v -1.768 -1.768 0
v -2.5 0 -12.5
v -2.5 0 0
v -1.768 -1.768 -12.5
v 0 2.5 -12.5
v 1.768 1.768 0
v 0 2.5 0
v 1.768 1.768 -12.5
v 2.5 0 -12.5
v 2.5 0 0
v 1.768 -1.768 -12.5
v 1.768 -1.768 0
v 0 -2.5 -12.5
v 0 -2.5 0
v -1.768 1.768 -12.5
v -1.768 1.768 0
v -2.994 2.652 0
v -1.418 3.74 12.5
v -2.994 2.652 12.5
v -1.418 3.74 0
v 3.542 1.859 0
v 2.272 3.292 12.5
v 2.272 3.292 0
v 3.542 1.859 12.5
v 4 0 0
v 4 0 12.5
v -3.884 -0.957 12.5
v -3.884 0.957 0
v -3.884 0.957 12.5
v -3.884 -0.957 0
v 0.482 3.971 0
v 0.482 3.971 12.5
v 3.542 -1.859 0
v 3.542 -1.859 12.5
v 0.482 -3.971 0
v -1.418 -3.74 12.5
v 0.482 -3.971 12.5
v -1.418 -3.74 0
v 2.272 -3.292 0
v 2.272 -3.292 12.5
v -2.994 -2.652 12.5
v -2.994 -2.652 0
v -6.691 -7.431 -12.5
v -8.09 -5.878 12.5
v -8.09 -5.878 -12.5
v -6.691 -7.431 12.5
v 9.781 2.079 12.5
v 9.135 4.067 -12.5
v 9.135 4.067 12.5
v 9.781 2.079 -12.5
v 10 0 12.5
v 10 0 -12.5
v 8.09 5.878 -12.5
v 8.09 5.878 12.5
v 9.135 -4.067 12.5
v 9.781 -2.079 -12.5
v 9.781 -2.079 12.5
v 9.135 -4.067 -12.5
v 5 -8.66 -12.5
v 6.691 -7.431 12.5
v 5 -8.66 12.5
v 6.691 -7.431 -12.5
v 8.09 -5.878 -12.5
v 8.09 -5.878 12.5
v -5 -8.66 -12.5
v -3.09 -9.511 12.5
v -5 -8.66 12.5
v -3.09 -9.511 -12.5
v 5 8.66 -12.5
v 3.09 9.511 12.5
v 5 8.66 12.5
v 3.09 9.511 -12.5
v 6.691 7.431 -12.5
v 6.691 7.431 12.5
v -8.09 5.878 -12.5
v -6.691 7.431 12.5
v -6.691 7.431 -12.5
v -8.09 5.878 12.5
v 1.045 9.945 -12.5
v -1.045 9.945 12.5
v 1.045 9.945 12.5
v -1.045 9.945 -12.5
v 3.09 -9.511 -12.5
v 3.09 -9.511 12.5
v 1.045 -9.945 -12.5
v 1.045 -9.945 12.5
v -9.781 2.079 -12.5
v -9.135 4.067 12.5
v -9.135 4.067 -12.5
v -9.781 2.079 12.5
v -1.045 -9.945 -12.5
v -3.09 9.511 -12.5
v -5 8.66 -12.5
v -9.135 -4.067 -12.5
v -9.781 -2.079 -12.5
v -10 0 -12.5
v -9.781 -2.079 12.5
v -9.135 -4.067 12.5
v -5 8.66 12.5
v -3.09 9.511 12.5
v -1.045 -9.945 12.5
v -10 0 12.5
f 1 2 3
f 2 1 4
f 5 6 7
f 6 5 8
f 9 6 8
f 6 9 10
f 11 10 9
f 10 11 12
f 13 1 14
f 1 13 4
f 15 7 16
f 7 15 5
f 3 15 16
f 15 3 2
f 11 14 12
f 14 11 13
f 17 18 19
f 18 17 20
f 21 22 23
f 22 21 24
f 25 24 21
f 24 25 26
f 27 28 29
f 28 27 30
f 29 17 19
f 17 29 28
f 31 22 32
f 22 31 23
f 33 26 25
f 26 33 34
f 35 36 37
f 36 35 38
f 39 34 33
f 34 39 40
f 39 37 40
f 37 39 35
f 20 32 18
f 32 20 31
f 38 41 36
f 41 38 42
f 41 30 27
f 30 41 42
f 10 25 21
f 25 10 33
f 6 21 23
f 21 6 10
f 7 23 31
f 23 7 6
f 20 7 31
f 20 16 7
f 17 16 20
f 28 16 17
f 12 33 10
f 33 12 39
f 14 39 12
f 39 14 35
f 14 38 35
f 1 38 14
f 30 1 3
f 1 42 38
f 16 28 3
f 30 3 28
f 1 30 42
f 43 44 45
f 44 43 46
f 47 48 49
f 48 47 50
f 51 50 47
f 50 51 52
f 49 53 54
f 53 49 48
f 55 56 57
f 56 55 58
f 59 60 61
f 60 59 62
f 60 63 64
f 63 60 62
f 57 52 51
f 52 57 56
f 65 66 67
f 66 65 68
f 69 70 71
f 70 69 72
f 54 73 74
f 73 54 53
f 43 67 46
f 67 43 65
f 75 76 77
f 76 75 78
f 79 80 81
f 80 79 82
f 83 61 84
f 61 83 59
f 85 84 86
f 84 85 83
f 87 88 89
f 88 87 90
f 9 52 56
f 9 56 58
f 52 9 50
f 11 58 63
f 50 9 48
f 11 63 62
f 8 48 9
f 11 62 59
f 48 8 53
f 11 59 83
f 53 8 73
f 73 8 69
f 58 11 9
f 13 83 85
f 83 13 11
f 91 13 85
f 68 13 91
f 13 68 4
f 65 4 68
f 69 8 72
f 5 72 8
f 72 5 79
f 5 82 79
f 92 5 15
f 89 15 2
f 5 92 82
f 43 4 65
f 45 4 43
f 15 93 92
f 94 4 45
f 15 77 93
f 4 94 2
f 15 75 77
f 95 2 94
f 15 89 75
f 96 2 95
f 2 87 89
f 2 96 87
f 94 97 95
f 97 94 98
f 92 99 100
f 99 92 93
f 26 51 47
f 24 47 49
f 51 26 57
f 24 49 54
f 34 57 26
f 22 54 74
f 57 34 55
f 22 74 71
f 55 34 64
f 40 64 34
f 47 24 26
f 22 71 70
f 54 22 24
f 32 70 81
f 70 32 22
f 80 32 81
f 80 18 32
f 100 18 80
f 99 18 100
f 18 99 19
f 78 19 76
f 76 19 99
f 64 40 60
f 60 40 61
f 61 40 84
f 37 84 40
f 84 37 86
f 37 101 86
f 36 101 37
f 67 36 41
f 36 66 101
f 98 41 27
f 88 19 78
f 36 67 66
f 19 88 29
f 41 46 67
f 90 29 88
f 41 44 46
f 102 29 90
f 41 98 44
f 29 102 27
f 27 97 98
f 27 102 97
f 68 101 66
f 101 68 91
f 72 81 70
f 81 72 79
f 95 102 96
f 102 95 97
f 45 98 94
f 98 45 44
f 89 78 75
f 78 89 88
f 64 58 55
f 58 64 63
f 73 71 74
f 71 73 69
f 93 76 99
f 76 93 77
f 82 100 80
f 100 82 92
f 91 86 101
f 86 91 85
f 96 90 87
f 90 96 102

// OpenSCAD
// file: helper.scad
//$fa=5; $fs=0.1;

// скругление - это надо вычитать 
//module rounder(corner=[0,0,0], rradius=2, rheight){
//        translate(corner) 
//            difference(){
//                cube([rradius,rradius,rheight]);
//                translate([rradius,rradius,0]) cylinder(r=rradius, h=rheight);
//            }
//}   

// параллелепипед со скругленными вертикальными ребрами
module cuberv(size, rradius=2){
    hull(){
        translate([rradius,rradius,0]) cylinder(r=rradius, h=size[2]);
        translate([size[0]-rradius, rradius, 0]) cylinder(r=rradius, h=size[2]);
        translate([rradius, size[1]-rradius, 0]) cylinder(r=rradius, h=size[2]);
        translate([size[0]-rradius, size[1]-rradius, 0]) cylinder(r=rradius, h=size[2]);
    }
}


//rounder([0,0,0], 2, 30);
//cuberv([30,30,30]);
// main file
use <helper.scad>

//профиль
//module profile(length) {
//	color([0.7,0.7,0.7]) scale([1,1,length]) translate([-100, -100, -0.5]) import("prof20x20.stl", convexity=3);
//}
// упрощенный
module profile(length) {
    color([0.7,0.7,0.7])
        difference(){
            union(){
                cube([20,20,length], center=true);
            }//u
            union(){
                translate([-10, 0, 0]) cylinder(r=3, h=length+0.1, center=true);
                translate([10, 0, 0]) cylinder(r=3, h=length+0.1, center=true);
                translate([0, 10, 0]) cylinder(r=3, h=length+0.1, center=true);
                translate([0, -10, 0]) cylinder(r=3, h=length+0.1, center=true);
            }//u
        }//d
}//m

//profile(100);

// уголок профильный
module corner(){
	difference(){
		linear_extrude(height = 20) polygon([[0,0],[25,0],[25,5],[5,25],[0,25]]);
		
		union(){
			translate([-0.1, 17, 10]) rotate([0,90,0]) cylinder (r=2.2, h=20);
			translate([8, 17, 10]) rotate([0,90,0]) cylinder (r=6, h=10);
	
			translate([17, -0.1, 10]) rotate([-90,0,0]) cylinder (r=2.2, h=20);
			translate([17, 8, 10]) rotate([-90,0,0]) cylinder (r=6, h=20);
		}
	}
}

//corner();

//трехсторонний соединитель
module triway(){
	color([0,1,1]){
	translate([-10,-10,0]) cube([20,20,5.5]);
	translate([-25.5, -5.5/2, 0]) cube([15.5, 5.5, 5.5]);
	translate([-5.5/2, 10, 0]) cube([5.5, 15.5, 5.5]);
	translate([-5.5/2, -10, -15.5]) cube([5.5, 5.5, 15.5]);
	translate([10-5.5, -5.5/2, -15.5]) cube([5.5, 5.5, 15.5]);}
}

//triway();

//рельса MGN12 300мм
module rail(){
	difference(){
		union(){
			cube([300, 12, 8], center=true);
		}//u
		union(){
			for(xpos = [10 : 25 : 300]) {
				translate([-150+xpos, 0, 0]) cylinder(r=2, h=8.1, center=true);
				translate([-150+xpos, 0, 2]) cylinder(r=3, h=4.1, center=true);		
			}
		}//u
	}//d	
}//m

//рельса MGN12 350мм
module rail350(){
	difference(){
		union(){
			cube([350, 12, 8], center=true);
		}//u
		union(){
			for(xpos = [10 : 25 : 350]) {
				translate([-175+xpos, 0, 0]) cylinder(r=2, h=8.1, center=true);
				translate([-175+xpos, 0, 2]) cylinder(r=3, h=4.1, center=true);		
			}
		}//u
	}//d	
}//m

//каретка MGN12H
module carriage(){
	difference(){
		union(){
			translate([0,0,4]) color([0.7, 0, 0]) cube([45.4, 27, 10], center=true);
		}//u
		union(){
			translate([-10, -10, 6.5]) cylinder(h=5.1, r=1.5, center=true);
			translate([10, -10, 6.5]) cylinder(h=5.1, r=1.5, center=true);
			translate([-10, 10, 6.5]) cylinder(h=5.1, r=1.5, center=true);
			translate([10, 10, 6.5]) cylinder(h=5.1, r=1.5, center=true);
		}//u
	}//d
}//m

//NEMA17
module motor(){
	mwidth=42.3;
	mheight=48;
	difference(){
		union(){
			color([0.4, 0.4, 0.4]) cube([mwidth, mwidth, mheight], center=true);
			color([0.1, 0.1, 0.1]) translate([0, 0, mheight/2+1]) cylinder(h=2, r=11, center=true);
			color([0.8, 0.8, 0.8]) translate([0, 0, mheight/2+12]) cylinder(h=24, r=2.5, center=true);
		}
		union(){
			translate([-15.5, -15.5, mheight/2 - 2.25]) cylinder(h=4.6, r=1.5, center=true);
			translate([-15.5, 15.5, mheight/2 - 2.25]) cylinder(h=4.6, r=1.5, center=true);
			translate([15.5, -15.5, mheight/2 - 2.25]) cylinder(h=4.6, r=1.5, center=true);
			translate([15.5, 15.5, mheight/2 - 2.25]) cylinder(h=4.6, r=1.5, center=true);
		}
	}//difference
}//module

//GT2 20teeth pulley
module pulley(){
	translate([0,0,-8]) color([0,0.5,0])
	difference(){
		union(){
			translate([0,0,4.5]) cylinder(h=9, r=8, center=true);
			translate([0,0,9+3]) cylinder(h=6, r=6, center=true);
			translate([0,0,9+6+0.5]) cylinder(h=1, r=8, center=true);
		}//u
		union(){
			translate([0,0,8]) cylinder(h=16.1, r=2.5, center=true);
		}//u
	}//d
}//m

//608zz without washerz
module roller(){
	color([0,0,0.8])
	difference(){
		union(){
			cylinder(r=11, h=7, center=true);
			//translate([0,0,7/2+0.5]) cylinder(r=13, h=1, center=true);
			//translate([0,0,-7/2-0.5]) cylinder(r=13, h=1, center=true);
		}//u
		union(){
			cylinder(r=4, h=9.1, center=true);
		}//u
	}//d
}//m

//nema17 holder cnc-tech
module motor_holder(){
	color([1,0,0])
	difference(){
		union(){
			translate([-65/2,0,0]) cube([65,56,5]);
			translate([-65/2, 0, -45]) cube([65,5,45]);
		}//u
		union(){
			translate([0, 36, -0.1]) {
				cylinder(r=27/2, h=5.2);
				translate([-31/2,-31/2,0]) cylinder(r=1.75, h=5.2);
				translate([-31/2,31/2,0]) cylinder(r=1.75, h=5.2);
				translate([31/2,-31/2,0]) cylinder(r=1.75, h=5.2);
				translate([31/2,31/2,0]) cylinder(r=1.75, h=5.2);
			}//t

			translate([-65/2+7.5, 2.5, -45+7]){
				rotate([90,0,0]) cylinder(r=2.5, h=5.1, center=true);
				translate([10,0,0]) rotate([90,0,0]) cylinder(r=2.5, h=5.1, center=true);
				translate([40,0,0]) rotate([90,0,0]) cylinder(r=2.5, h=5.1, center=true);
				translate([50,0,0]) rotate([90,0,0]) cylinder(r=2.5, h=5.1, center=true);

				translate([0,0,25]){
					rotate([90,0,0]) cylinder(r=2.5, h=5.1, center=true);
					translate([10,0,0]) rotate([90,0,0]) cylinder(r=2.5, h=5.1, center=true);
					translate([40,0,0]) rotate([90,0,0]) cylinder(r=2.5, h=5.1, center=true);
					translate([50,0,0]) rotate([90,0,0]) cylinder(r=2.5, h=5.1, center=true);
				}//t
			}//t
		}//u
	}//d
}//m

//motor_holder();
//motor_holder2();

// под подшипники

module 608washer_2dot5mm(){
	difference(){
		union(){
			translate([0,0,-0.25]) cylinder(h=2, r=13, center=true);
			translate([0,0,1]) cylinder(h=0.5, r=6, center=true);
		}//u

		cylinder(h=2.6, r=4.1, center=true);
	}//d
}//m

module 608washer_6mm(){
	difference(){
		union(){
			translate([0,0,-0.25]) cylinder(h=5.5, r=13, center=true);
			translate([0,0,3-0.25]) cylinder(h=0.5, r=6, center=true);
		}//u

		cylinder(h=6.1, r=4.1, center=true);
	}//d
}

// зубы под ремень передние
module gt2teeth(){
	color([0.5,0,0]){ 
			for(xpos = [0 : 2 : 12]){
				translate([xpos, -1,3]) cube([1,1,8]); 
			}//f
			translate([0, -5, 3]) cube([13,3,8]);
			translate([0,-5,0]) cube([13,5,3]);
	}//c
}//m

// зубы под ремень задние
module gt2teeth_back(){
	color([0.5,0,0]) translate([13, -7, 0]) rotate([0,0,180])  { 
			for(xpos = [0 : 2 : 12]){
				translate([xpos, -4,3]) cube([1,1,8]); 
			}//f
			translate([0, -7, 3]) cube([13,3,8]);
			translate([0, -2, 3]) cube([13,2,8]);
			translate([0,-7,0]) cube([13,7,3]);
	}//c

		//translate([13,-7,0]) rotate([-90,0,90]) linear_extrude(height=13) polygon([[0,0],[7,0],[0,3]]);
}//m

//gt2teeth_back();

// e3dv6+volcano
module volcano(){
	translate([0,0,1.85]) cylinder(h=3.7, r=8, center=true);
	translate([0,0,-3]) cylinder(h=6, r=6, center=true);
	translate([0,0,-7.5]) cylinder(h=3, r=8, center=true);
	translate([0,0,-11]) cylinder(h=4, r=4, center=true);
	translate([0,0,-26]) cylinder(h=26, r=11.15, center=true);
	translate([0,0,-40.25]) cylinder(h=2.5, r=2, center=true);
	translate([-4.5,-4.5,-61.5]) cube([11.5,20,20]);
	translate([0,0,-63]) cylinder(h=3, r=4, center=true);
	translate([0,0,-65.5]) cylinder(h=2, r1=1, r2=2, center=true);
}

// 40mm cooler
module 40mm_cooler(){
	color([0.3,0.3,0.3]){
	difference(){
		union(){
			cube([40,40,10], center=true);
		}//u

		union(){
			translate([-16, -16, 0]) cylinder(r=1.75, h=10.1, center=true);
			translate([-16, 16, 0]) cylinder(r=1.75, h=10.1, center=true);
			translate([16, -16, 0]) cylinder(r=1.75, h=10.1, center=true);
			translate([16, 16, 0]) cylinder(r=1.75, h=10.1, center=true);

			cylinder(r=19, h=10.1, center=true);
		}//u
	}//d

	cylinder(r=10, h=10, center=true);
	translate([0,0,-5])
	for(angle = [0 : 40 : 360]) {
		rotate([45,0,angle]) cube([17, 1, 10]);
	}//f
	}//c
}//m

// 40 mm blower
module 40mm_blower(){
	color([0.3,0.3,0.3]){
	difference(){
		union(){
			hull(){
				cylinder(r=20, h=20);
				translate([0,-20,0]) cube([20,30, 20]);		
			}
			
			//ухи
			hull(){
				translate([-17.5,-17.5,0]) cylinder(r=2.5, h=15);
				translate([-12, -12, 0]) cylinder(r=5, h=15);
			}
			
			hull(){
				translate([-17.5,17.5,0]) cylinder(r=2.5, h=15);
				translate([-12, 12, 0]) cylinder(r=5, h=15);
			}			

			hull(){
				translate([17.5,17.5,0]) cylinder(r=2.5, h=15);
				translate([12, 12, 0]) cylinder(r=5, h=15);
			}
		}//u
		union(){
			translate([0,0,2]) cylinder(r=18, h=16); //нутро
			translate([0,0,17.9]) cylinder(r=15, h=2.2);
			translate([0, -18, 2]) cube([20.1, 26, 16]);

			translate([17.5,17.5,-0.1]) cylinder(r=1.5, h=15.2); //крепежные
			translate([-17.5,17.5,-0.1]) cylinder(r=1.5, h=15.2);
			translate([-17.5,-17.5,-0.1]) cylinder(r=1.5, h=15.2);
		}//u
	}//d
	
	//крыльчатка
	translate([0,0,2]) cylinder(r=13, h=15);
	for(angle = [0 : 10 : 180]) translate([0,0,9.5]) rotate([0,0,angle]) cube([34, 1, 15], center=true); 	
		
	}//c
}//m

//SH12 держатель вала
module sh12(){
	color([0.9,0.9,0.9])
	difference(){
		union(){
			translate([-10,0,0]) cube([20, 37.5, 14]);
			translate([-21,0,0]) cube([42, 6, 14]);
		}//u
		union(){
			translate([0, 23, -0.1]) cylinder(r=6, h=14.2);
			translate([-0.5, 29-0.1, -0.1]) cube([1, 37.5-29+0.2, 14.2]);

			translate([-16, -0.1, 7]) rotate([-90,0,0]) cylinder(r=5.5/2, h=6.2);
			translate([16, -0.1, 7]) rotate([-90,0,0]) cylinder(r=5.5/2, h=6.2);
		}//u
	}//d
}//m

//sh12();

//SH16 держатель вала - он же держатель E3D!
module sh16(){
	color([0.9,0.9,0.9])
	difference(){
		union(){
			translate([-12.5,0,0]) cube([25, 44, 16]);
			translate([-24,0,0]) cube([48, 6, 16]);
		}//u
		union(){
			translate([0, 27, -0.1]) cylinder(r=8, h=16.2);
			translate([-0.5, 35-0.1, -0.1]) cube([1, 10, 16.2]);

			translate([-19, -0.1, 8]) rotate([-90,0,0]) cylinder(r=5.5/2, h=6.2);
			translate([19, -0.1, 8]) rotate([-90,0,0]) cylinder(r=5.5/2, h=6.2);

			translate([0,39.5,8]) rotate([0,90,0]) cylinder(r=2.2, h=25.1, center=true);
		}//u
	}//d
}//m

//sh16();

// муфта
module coupling(){
	color([1,1,1])
	difference(){
		union(){
			translate([0,0,-12.5]) cylinder(r=10, h=25);
		}//m
		union(){
			translate([0,0, -12.6]) cylinder(r=2.5, h=12.7);
			cylinder(r=4, h=12.7);
		}//m
	}//d
}//m
		
coupling();

// воздуховод бловера
module blower_duct(){
	color([0,0.9,0]) difference(){
		union(){
			rotate([0,90,0]) cylinder(r=10, h=30, center=true);
			translate([-15, -10, 0]) cube ([30, 20, 21.5]);
			translate([-15, 0, -10]) cube([30, 21.5, 12]);
			translate([0,20,-3]) rotate([0,90,0]) cylinder(r=5, h=30, center=true);

			
		}//u
		union(){
            translate([0,20,-12]) rotate([0,90,0]) cylinder(r=6, h=30.1, center=true); //срез сопла
            //scale([2,1,1])
            {
            translate([0, 0, 12.1]) cube([26, 16, 19.1], center=true); //верх
            translate([0, 12, -4]) rotate([-25,0,0]) cube([26, 41.5, 5], center=true); //уклон
            translate([0, 5, 3]) cube([26, 6,9], center=true); //срезать уголок
            }
            
            translate([0, 20.5, -0.1]) rotate([-25,0,0]) cube([30.1, 20.5, 5], center=true); //верх снаружи
            translate([0, 0, -8]) rotate([-25,0,0]) cube([30.1, 30, 7], center=true); //низ снаружи
            
		}//u
	}//d
}//m

//lm12luu
module lm12luu(){
	color([0.5,0.5,0.5])
	difference(){
		cylinder(r=21/2, h=57, center=true);
		cylinder(r=12/2, h=57.1, center=true);
	}//d
}//m

// держатель подшипника Z
module z_bearing(){
	color([0.8,0.8,0.8])
	difference(){
		union(){
			cylinder(h=6, r=21); //фланец
			translate([0,0,-51]) cylinder(r=21/2+2, h=51);
		
		}//u
		union(){
			//крепеж фланца
			translate([-16,0,-0.1]) cylinder(r=2, h=6.2);
			translate([0,-16,-0.1]) cylinder(r=2, h=6.2);
			translate([16,0,-0.1]) cylinder(r=2, h=6.2);
			translate([0,16,-0.1]) cylinder(r=2, h=6.2);
			
			//под подшипник
			translate([0,0,-51.1]) cylinder(r=21/2+0.2, h=57.2);
			
		}//u
	}//d
	translate([0,0,-22.5]) lm12luu();
}//m

//-------------XY---------------
module xy(){
difference(){
		union(){
			translate([0,0,-35]) cube([33,45.4,38]); //основной кубикъ
			translate([-10,0,-8]) cube([10,45.4,11]); //влево
			translate([23,12.5,0]) cube([10,20.5,30]); //вверх
			translate([0,12.5,21]) cube([33, 20.5,10]); //крышка
		}//u
		union(){
			translate([-10.1, 15.1, -23.1]) cube([50,15.2,15.2]); //под профиль
			translate([-10.1, 16.6, -8.1]) cube([50, 12.2, 8.2]); //под рельсу

			translate([-0.1, 45.4/2, -35 + 27/2]){ //отверстия крепления к Y-каретке
				translate([0,-10,-10]) rotate([0,90,0]) cylinder(r=2, h=40);
				translate([0,10,-10]) rotate([0,90,0]) cylinder(r=2, h=40);
				translate([0,-10,10]) rotate([0,90,0]) cylinder(r=2, h=40);
				translate([0,10,10]) rotate([0,90,0]) cylinder(r=2, h=40);
			}

			translate([10,22.7,0]) cylinder(r=4.2, h=50); // под ось

			translate([17, -0.1, -15]) rotate([-90,0,0]) cylinder(r=1.7, h=50); // фиксировать профиль
		}//u
	}//d
}//m

//xy();

// задний держатель
module back_holder(){
	difference(){
		union(){
			cube([50,20,14.5]); //основа
			translate([28,0,14.5]) cube([10,20,28]); //вверх
			translate([5,0,32.5]) cube([33,20,10]); //крышка

			translate([0,-10,-20]) cube([38,10,34.5]);//обхват
			translate([0,20,-20]) cube([38,10,34.5]);
		}//u
		union(){
			translate([25, -10.1, -10]) rotate([-90,0,0]) cylinder(r=2.2, h=40.2); //боковые
			translate([44, 10, -0.1]) cylinder(r=2.2, h=15); //верхнее
			translate([15, 10, -0.1]) cylinder(r=4.2, h=50); //под ось

			translate([9, -10.1, -10]) rotate([-90,0,0]) cylinder(r=2.2, h=12); //бокоуголковое
		}//u
	}//d

	translate([-8,0,-20]) rotate([0,0,-90]) corner(); //уголок сюда

}//m

//back_holder();

module head_base(){
difference(){
		union(){
			color([0.5,0,0.5]) {
				translate([(45.4-46)/2, 0, 0]) cuberv([46,24.5,16]); //основа
				translate([(45.4-30)/2, 24.5-3, 0]) cuberv([30,3+3,16]); //основа2
				translate([-14.3-2,2.5,0]) cuberv([22+2,22,16]); //лев
				translate([(45.4-30)/2+30,2.5,0]) cuberv([22+2,22,16]); //прав
				
				translate([(45.4-30)/2+39-1.3,2.5,-4.5]) cube([14.3,22,4.5]); //прав-низ

				translate([-14.3,2.5,-4.5]) cube([14.3,22,4.5]); //лев-низ
			
			}
			translate([-14.3, 2.55,4.5]) gt2teeth(); //передний левый крепеж - верхний ремень
			translate([46.7, 2.55,-4.5]) gt2teeth(); //передний правый крепеж - нижний ремень

			translate([-14.3, 29.5, -4.5]) gt2teeth_back(); //задний левый крепеж - нижний ремень
			translate([46.7, 29.5, 4.5]) gt2teeth_back(); //задний правый крепеж - верхний ремень

		}//u
		union(){
			translate([12.7,3.5,10]){ //крепление к каретке
				cylinder(r=2, h=20.1, center=true);
				translate([20,0,0]) cylinder(r=2, h=20.1, center=true);
				translate([0,20,0]) cylinder(r=2, h=20.1, center=true);
				translate([20,20,0]) cylinder(r=2, h=20.1, center=true);
			}
			// крепление держателя хотэнда к карррретке
			translate([3.6, 12, 8]) rotate([-90,0,0]) cylinder(r=2, h=33, center=true);
			translate([3.6+38, 12, 8]) rotate([-90,0,0]) cylinder(r=2, h=33, center=true);

		}//u
	}//d
}//m


//head_base();

module head(){
	difference(){
		union(){
			head_base();
			translate([22.7,0,0]) rotate([0,0,180]) sh16();
			translate([22.7,-27,12.5]) color([0.8,0.8,0.7]) volcano();
		}//u
		union(){
		
		}//u
	}//d
}
//head();

module roller_washer(){
    difference(){
        union(){
            cylinder(r=12.5, h=0.6);
            translate([0,0,0.6]) cylinder(r=6, h=0.4);
        }
        translate([0,0,-0.1]) cylinder(r=4.2, h=1.2);
    }
}

// оптический концевик
module endstop(){
	difference(){
		union(){
			color([1,0,0]) cube([33,10,1]);
			color([0.2,0.2,0.2]){
			translate([9,2,1]) cube([24,6,3]);
			translate([15,2,4]) cube([4.5,6,8]);
			translate([22.5,2,4]) cube([4.5,6,8]);
			}

			color([0.9,0.9,0.9]) translate([1,1,-8]) cube([4,8,8]);
		}
		union(){
			translate([11.5,5,-0.1]) cylinder(r=1.5, h=4.2);
			translate([11.5+19,5,-0.1]) cylinder(r=1.5, h=4.2);
		}
	}
}
		
//endstop();

module endstop_plank(){
	cube([1,9.3,10]);
	translate([-2,6,0]) cube([5,3.3,10]);
}

module endstop_holder(){
	difference(){
		union(){
			cube([27,8,8]);
			translate([1,-2,0]) cube([6,2,8]);
			translate([20,-2,0]) cube([6,2,8]);
		}
		union(){
			translate([1,2,2]) cube([6,4,6.1]);
			translate([20,2,2]) cube([6,4,6.1]);

			translate([4,-2.1,5]) rotate([-90,0,0]) cylinder(r=1.7, h=10.2);
			translate([23,-2.1,5]) rotate([-90,0,0]) cylinder(r=1.7, h=10.2);
		}
	}
}

//endstop_holder();
